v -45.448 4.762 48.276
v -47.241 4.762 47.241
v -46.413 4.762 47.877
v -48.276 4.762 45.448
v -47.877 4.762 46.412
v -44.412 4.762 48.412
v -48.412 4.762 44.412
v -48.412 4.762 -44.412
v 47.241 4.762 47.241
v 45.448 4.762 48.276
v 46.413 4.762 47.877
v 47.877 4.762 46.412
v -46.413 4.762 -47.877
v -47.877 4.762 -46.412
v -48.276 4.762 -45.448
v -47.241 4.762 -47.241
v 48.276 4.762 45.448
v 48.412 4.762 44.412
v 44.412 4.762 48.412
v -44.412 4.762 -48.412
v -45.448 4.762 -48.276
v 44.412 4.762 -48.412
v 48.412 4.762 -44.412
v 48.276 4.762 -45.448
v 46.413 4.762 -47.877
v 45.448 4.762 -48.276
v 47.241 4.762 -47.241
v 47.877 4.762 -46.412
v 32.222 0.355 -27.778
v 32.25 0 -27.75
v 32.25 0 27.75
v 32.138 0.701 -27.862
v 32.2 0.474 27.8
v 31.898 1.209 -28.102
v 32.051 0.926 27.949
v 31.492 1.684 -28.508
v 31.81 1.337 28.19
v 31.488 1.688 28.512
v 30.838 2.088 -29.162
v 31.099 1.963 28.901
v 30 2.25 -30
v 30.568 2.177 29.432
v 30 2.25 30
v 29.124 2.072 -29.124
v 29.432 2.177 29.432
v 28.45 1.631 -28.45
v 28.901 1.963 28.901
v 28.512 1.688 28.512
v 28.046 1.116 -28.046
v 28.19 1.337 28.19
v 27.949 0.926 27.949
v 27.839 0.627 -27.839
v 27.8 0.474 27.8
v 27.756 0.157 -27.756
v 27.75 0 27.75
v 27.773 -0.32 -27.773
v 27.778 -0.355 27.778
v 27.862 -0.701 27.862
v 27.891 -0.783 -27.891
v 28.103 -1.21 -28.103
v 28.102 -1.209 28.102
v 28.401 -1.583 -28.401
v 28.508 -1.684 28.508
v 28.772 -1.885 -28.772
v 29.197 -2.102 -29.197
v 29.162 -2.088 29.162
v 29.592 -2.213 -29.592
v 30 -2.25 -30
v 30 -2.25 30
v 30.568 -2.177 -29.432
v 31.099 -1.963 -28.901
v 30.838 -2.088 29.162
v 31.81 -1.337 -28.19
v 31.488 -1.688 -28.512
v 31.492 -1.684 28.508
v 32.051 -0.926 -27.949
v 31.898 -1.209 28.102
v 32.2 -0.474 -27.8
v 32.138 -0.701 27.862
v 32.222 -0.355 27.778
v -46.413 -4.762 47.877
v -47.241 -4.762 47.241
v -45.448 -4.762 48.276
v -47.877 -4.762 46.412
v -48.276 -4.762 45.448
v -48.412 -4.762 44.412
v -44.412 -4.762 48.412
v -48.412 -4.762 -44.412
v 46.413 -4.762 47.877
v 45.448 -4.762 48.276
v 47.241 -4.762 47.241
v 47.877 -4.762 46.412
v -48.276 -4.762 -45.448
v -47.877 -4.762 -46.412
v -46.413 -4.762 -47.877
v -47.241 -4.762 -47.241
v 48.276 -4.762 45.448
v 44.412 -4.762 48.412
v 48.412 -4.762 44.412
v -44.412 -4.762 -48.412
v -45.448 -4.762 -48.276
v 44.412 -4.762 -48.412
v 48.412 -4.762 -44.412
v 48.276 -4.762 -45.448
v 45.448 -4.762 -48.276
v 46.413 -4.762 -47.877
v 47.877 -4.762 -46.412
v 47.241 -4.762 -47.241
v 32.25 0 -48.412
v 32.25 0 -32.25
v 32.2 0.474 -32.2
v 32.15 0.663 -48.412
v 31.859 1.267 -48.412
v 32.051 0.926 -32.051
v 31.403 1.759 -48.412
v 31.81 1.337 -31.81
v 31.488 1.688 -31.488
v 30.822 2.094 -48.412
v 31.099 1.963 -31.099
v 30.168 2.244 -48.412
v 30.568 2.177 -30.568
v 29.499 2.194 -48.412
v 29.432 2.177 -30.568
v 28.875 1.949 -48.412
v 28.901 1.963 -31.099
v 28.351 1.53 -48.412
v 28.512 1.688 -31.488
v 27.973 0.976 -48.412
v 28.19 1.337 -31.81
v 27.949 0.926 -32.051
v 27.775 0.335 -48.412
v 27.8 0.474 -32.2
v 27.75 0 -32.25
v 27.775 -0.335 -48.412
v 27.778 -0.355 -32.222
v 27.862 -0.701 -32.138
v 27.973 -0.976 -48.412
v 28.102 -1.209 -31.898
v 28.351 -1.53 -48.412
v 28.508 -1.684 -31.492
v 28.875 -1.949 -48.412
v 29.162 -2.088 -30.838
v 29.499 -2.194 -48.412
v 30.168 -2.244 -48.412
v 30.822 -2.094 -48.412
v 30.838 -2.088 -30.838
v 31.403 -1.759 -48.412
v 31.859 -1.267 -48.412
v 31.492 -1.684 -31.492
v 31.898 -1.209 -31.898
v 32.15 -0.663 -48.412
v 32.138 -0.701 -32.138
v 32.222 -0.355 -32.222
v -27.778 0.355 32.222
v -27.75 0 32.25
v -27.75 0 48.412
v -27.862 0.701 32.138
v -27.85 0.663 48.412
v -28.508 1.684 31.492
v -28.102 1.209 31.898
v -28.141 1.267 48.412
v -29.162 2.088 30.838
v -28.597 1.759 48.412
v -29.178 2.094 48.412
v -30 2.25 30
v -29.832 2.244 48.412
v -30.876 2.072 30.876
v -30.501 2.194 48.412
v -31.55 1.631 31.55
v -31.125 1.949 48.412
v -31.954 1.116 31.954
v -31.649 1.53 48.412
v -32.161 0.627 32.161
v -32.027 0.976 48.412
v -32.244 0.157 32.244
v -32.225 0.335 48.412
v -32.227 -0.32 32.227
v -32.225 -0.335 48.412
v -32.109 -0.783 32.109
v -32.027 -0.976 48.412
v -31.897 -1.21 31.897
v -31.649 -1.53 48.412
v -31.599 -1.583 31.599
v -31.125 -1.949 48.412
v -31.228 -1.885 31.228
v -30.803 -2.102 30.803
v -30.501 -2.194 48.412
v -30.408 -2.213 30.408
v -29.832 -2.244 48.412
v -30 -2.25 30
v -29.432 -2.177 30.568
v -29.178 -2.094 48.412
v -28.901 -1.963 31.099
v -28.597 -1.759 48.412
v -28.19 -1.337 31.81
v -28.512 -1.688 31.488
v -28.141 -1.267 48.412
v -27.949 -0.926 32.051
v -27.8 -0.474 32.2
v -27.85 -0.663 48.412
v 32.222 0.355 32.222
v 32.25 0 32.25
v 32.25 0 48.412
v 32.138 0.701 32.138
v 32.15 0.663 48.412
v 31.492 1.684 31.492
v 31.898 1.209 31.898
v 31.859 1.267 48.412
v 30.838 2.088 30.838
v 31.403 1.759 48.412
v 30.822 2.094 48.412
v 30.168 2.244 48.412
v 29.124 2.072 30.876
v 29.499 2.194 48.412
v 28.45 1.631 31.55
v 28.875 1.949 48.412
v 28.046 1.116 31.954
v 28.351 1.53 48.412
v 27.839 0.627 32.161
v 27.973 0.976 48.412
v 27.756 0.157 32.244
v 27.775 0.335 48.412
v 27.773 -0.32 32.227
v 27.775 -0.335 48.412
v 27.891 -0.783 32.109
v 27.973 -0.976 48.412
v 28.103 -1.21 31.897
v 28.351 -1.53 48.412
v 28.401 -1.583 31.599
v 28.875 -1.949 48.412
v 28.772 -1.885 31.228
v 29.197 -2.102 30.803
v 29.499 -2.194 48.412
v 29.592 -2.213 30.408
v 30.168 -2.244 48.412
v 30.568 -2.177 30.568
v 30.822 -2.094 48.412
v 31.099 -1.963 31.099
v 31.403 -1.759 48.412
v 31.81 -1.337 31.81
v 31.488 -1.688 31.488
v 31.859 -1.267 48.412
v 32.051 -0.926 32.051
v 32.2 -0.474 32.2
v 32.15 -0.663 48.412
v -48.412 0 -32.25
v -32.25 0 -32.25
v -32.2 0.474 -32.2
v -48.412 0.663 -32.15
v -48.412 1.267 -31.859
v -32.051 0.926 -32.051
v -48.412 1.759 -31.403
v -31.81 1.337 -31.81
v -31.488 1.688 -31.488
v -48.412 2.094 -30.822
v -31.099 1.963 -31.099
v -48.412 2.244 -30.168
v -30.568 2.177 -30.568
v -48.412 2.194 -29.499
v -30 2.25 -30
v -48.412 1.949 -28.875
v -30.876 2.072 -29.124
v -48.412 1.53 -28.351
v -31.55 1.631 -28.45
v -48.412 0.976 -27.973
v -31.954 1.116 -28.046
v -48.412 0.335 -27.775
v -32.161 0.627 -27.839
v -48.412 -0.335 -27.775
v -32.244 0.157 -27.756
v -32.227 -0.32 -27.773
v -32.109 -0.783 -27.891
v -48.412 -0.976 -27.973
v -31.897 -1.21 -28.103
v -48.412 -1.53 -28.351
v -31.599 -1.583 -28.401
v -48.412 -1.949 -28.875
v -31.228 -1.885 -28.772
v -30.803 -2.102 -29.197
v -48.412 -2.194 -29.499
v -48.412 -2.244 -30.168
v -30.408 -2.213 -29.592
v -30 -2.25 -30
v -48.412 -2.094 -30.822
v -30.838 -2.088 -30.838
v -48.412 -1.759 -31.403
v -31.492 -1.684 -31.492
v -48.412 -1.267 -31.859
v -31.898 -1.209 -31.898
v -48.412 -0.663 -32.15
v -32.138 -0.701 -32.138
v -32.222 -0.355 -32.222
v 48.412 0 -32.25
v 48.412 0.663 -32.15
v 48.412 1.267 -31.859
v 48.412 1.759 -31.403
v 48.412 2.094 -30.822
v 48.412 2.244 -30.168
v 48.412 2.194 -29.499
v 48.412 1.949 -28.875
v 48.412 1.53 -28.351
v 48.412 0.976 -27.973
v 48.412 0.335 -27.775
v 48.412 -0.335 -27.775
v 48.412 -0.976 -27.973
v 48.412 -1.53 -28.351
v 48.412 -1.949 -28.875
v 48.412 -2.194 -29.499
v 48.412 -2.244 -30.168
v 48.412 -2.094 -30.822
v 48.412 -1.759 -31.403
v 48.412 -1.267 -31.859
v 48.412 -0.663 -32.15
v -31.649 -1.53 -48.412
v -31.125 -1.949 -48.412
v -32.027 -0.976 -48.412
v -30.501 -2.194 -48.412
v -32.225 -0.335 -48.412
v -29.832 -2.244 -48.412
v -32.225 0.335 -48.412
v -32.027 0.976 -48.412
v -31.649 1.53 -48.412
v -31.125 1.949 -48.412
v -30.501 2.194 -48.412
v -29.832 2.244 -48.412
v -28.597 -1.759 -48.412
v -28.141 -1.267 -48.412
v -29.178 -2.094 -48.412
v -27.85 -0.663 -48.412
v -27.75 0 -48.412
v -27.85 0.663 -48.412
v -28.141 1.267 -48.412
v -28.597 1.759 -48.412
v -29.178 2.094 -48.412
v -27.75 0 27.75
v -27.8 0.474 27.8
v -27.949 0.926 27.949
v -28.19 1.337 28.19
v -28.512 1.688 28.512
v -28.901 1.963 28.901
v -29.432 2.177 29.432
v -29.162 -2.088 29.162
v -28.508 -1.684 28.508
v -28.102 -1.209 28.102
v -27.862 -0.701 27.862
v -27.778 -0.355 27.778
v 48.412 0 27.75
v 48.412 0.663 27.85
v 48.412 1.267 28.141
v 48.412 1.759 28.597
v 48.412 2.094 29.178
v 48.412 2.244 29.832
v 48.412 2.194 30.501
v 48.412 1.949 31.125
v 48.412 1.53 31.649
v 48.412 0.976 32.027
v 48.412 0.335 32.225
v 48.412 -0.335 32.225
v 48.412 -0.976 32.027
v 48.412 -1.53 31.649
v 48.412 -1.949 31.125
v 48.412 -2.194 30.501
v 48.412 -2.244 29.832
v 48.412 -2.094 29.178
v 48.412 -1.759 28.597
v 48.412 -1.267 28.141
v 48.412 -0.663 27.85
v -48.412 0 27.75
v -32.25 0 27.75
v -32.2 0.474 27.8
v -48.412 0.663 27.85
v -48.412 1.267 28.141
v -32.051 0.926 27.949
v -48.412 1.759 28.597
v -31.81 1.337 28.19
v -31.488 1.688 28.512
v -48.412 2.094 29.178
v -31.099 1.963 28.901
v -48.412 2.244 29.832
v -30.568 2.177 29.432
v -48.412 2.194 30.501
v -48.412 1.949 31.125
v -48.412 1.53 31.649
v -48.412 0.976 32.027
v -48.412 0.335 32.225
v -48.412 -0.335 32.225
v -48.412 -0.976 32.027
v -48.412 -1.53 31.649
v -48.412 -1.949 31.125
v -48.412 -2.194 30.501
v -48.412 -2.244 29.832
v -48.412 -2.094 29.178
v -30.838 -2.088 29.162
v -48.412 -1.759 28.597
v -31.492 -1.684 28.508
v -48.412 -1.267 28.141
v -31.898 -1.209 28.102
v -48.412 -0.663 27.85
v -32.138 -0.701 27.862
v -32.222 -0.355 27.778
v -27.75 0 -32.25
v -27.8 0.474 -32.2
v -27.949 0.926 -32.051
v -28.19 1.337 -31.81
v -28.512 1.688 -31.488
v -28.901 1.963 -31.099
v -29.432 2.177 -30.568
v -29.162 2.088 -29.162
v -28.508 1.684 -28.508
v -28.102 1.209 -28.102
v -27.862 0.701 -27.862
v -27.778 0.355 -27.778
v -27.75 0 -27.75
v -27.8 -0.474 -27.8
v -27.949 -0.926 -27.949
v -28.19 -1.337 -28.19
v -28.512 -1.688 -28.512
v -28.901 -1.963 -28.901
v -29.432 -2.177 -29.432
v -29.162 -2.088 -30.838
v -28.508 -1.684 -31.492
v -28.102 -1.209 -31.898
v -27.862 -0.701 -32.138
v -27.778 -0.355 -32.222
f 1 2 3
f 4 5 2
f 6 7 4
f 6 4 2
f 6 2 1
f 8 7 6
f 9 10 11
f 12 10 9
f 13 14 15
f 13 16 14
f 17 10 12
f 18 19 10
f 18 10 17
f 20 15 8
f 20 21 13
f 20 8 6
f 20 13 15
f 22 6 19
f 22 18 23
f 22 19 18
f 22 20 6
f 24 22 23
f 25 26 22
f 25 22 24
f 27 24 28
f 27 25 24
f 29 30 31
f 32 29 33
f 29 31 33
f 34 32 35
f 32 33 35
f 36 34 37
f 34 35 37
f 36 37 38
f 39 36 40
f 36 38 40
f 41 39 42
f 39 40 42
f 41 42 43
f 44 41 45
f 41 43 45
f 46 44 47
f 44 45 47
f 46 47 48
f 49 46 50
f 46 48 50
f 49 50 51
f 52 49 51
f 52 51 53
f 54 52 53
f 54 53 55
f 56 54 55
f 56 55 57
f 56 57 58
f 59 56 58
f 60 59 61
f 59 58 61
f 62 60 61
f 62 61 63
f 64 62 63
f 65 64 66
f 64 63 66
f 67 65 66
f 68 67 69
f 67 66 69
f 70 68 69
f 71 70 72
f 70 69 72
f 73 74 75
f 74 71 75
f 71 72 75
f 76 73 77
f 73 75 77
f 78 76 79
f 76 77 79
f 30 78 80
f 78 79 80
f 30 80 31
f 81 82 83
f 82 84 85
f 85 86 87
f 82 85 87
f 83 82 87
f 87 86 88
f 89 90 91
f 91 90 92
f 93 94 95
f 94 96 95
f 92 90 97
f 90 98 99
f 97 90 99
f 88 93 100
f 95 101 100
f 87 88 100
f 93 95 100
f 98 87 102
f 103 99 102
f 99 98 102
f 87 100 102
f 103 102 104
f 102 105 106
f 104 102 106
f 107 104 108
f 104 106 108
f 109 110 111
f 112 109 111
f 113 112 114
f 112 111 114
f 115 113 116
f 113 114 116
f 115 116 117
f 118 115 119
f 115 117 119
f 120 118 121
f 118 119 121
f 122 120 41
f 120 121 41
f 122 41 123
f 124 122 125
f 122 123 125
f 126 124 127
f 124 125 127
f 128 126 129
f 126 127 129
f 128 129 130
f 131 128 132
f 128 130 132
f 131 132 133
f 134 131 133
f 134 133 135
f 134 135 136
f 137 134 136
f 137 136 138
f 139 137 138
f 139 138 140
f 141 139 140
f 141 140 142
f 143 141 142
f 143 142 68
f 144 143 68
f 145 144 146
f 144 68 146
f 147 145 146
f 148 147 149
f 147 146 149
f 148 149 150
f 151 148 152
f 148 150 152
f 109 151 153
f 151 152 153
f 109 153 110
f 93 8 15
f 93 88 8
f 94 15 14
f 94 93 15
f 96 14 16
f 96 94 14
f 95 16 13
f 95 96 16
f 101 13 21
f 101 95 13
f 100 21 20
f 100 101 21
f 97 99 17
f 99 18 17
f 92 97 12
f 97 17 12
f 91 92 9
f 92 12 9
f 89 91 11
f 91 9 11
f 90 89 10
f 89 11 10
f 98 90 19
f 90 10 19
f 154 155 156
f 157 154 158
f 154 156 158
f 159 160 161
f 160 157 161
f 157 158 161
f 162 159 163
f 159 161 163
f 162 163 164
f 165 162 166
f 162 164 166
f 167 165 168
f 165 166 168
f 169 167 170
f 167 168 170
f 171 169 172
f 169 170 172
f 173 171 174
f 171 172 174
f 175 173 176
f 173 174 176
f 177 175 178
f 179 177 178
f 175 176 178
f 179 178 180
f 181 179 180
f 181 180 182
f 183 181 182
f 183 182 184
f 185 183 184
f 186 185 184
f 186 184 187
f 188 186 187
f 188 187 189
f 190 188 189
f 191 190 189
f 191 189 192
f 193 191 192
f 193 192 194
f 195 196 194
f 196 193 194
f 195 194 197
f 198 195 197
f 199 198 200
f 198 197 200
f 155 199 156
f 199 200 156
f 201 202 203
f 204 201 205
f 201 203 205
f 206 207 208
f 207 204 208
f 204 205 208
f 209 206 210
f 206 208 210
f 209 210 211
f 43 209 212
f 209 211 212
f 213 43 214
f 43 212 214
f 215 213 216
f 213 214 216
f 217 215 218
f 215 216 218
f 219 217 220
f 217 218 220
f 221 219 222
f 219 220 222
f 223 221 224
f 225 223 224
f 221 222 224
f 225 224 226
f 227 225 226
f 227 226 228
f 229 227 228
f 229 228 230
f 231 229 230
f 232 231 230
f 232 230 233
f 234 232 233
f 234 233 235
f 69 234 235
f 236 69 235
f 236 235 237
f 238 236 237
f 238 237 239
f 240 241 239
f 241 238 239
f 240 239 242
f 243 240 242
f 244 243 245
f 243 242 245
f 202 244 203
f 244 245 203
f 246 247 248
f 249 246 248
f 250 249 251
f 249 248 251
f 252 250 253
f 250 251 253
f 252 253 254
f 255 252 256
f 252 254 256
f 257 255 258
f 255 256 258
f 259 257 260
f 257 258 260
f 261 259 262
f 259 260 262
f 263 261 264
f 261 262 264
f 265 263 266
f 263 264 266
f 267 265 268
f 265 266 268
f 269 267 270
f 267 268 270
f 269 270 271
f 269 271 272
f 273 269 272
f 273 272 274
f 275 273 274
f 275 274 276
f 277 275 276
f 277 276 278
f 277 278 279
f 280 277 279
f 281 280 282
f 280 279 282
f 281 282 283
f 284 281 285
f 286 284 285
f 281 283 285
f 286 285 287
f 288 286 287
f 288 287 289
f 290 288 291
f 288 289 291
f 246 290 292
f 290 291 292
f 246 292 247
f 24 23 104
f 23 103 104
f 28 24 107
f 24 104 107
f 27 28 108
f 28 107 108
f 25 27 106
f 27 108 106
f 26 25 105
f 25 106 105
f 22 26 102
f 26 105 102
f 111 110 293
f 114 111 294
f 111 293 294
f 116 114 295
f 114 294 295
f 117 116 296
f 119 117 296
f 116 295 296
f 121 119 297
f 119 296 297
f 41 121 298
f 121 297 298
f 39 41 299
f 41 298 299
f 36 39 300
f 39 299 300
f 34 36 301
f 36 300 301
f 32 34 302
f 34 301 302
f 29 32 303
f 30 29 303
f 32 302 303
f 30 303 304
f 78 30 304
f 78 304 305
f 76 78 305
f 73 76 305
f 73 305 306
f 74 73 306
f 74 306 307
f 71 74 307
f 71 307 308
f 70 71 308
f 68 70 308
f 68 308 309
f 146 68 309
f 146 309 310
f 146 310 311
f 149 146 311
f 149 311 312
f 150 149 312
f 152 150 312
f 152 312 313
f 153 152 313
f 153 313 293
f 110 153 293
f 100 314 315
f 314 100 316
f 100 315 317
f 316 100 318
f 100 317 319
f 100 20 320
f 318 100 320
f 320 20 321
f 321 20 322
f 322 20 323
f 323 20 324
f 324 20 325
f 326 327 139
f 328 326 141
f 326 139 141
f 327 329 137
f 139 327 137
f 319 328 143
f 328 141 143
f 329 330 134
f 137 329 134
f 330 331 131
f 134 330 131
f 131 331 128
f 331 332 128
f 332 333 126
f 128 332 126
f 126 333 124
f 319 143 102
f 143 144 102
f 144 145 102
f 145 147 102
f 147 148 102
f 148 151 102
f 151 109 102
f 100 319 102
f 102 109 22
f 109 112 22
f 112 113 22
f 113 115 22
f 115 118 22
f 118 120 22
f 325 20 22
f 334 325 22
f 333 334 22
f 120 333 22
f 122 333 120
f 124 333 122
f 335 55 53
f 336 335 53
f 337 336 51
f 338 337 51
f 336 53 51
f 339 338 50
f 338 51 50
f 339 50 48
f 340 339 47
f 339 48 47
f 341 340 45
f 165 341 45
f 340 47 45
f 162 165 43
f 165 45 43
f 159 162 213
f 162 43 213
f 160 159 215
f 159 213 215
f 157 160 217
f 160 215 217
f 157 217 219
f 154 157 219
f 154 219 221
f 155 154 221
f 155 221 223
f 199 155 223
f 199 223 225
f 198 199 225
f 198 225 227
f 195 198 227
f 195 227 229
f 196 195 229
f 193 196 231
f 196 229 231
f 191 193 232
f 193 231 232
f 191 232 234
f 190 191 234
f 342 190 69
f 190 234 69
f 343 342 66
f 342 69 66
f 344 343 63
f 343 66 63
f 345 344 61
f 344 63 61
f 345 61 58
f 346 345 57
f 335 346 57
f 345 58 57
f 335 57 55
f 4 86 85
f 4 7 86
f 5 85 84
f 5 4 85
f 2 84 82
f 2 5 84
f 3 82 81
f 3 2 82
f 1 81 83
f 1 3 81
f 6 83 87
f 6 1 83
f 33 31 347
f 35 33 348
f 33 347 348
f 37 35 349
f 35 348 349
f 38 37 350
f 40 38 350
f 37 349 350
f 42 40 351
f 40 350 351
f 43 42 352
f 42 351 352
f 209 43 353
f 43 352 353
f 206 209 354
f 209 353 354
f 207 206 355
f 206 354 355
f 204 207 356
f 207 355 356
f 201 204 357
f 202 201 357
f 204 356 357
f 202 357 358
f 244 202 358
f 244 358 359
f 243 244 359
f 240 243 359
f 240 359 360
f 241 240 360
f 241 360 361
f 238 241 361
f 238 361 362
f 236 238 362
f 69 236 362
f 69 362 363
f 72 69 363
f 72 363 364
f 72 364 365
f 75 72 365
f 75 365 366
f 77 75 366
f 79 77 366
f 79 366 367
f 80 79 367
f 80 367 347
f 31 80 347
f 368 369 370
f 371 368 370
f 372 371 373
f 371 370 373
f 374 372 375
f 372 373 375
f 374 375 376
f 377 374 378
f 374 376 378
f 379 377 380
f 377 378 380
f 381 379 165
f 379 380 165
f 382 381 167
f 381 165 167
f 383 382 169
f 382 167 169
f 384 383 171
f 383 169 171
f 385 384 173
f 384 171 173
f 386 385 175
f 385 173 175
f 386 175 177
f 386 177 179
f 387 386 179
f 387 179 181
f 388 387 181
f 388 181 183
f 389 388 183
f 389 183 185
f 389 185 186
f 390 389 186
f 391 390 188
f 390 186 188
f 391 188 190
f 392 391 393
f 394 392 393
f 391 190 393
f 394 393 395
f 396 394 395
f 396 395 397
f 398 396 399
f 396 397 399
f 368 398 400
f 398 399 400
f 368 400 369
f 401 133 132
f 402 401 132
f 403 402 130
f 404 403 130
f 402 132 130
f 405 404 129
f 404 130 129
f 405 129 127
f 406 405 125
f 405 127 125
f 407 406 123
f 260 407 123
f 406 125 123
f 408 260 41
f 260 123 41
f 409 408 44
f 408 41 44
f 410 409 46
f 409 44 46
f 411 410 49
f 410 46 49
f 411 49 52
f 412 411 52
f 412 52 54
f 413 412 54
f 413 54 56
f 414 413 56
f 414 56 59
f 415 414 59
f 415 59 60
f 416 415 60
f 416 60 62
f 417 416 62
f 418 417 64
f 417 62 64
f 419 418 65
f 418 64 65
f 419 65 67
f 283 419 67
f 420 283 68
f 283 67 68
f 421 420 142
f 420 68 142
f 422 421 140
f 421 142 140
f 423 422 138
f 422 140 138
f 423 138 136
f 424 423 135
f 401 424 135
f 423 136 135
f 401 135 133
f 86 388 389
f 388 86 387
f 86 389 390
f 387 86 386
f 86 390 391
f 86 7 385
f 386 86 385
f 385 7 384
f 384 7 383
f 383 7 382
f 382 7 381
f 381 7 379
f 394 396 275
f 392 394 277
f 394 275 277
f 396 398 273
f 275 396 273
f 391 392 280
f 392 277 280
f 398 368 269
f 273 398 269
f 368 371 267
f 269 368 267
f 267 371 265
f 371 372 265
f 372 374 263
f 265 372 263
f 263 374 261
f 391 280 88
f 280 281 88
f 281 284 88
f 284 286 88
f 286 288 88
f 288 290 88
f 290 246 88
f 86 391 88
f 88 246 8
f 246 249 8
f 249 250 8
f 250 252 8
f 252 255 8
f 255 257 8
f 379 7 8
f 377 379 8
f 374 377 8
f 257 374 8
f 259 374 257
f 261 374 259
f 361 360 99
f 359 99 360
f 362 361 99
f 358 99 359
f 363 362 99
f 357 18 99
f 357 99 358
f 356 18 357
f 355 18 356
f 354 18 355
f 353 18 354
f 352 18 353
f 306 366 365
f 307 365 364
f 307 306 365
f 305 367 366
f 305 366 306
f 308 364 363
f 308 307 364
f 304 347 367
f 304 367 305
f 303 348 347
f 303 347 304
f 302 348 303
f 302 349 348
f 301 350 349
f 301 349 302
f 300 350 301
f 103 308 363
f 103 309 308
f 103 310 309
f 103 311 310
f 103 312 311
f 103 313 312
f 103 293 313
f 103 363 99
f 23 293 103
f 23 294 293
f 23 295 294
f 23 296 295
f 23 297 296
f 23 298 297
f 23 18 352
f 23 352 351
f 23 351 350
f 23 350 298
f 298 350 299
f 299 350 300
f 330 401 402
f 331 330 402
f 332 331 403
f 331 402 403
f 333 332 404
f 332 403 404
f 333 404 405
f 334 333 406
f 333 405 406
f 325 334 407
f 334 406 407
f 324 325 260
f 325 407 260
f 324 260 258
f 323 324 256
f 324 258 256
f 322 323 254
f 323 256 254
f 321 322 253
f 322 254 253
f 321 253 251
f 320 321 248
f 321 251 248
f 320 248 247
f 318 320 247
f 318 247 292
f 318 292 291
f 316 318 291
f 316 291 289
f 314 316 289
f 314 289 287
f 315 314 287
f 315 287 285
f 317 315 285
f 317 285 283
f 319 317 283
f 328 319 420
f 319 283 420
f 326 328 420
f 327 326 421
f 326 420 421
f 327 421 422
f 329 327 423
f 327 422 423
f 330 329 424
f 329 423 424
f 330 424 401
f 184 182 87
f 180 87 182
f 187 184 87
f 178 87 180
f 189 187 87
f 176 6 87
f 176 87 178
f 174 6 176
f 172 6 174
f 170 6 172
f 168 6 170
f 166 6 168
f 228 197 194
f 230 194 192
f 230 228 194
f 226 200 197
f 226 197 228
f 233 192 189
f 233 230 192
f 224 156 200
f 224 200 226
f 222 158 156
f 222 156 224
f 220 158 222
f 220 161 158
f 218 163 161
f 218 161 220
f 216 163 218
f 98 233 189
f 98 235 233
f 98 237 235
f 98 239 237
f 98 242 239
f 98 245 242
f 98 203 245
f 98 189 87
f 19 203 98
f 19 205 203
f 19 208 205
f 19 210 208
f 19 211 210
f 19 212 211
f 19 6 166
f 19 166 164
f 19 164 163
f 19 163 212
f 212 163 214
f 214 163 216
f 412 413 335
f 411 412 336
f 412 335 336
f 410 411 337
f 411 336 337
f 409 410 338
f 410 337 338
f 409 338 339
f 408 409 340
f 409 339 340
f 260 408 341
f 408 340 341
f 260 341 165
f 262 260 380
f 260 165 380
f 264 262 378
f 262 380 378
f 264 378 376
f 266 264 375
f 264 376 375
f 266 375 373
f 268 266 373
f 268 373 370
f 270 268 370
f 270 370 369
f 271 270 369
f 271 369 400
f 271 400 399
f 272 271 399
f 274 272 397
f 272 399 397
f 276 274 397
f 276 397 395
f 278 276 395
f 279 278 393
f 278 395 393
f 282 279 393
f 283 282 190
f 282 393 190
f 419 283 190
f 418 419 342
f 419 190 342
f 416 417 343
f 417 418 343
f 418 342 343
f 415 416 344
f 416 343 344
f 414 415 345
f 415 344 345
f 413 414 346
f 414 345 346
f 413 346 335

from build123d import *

# Parameters (mm, degrees)
SKETCH1_W            = 96.825
SKETCH1_H            = 96.825
BOSS_EXTRUDE1_DEPTH  = 4.7625
FILLET1_R            = 4
M4_CLEARANCE_HOLE1_D = 4.5
M4_CLEARANCE_HOLE2_D = 4.5


with BuildPart() as part:
    # Sketch1 → Boss-Extrude1 (new body, symmetric)
    with BuildSketch(Plane(origin=(0, 0, 0), x_dir=(1, 0, 0), z_dir=(0, 1, 0))):
        Rectangle(SKETCH1_W, SKETCH1_H)
    extrude(amount=BOSS_EXTRUDE1_DEPTH, both=True)

    # Fillet1
    fillet1_edges = [part.edges().sort_by_distance(p)[0] for p in [
        (-48.4125, 0, -48.4125),
        (48.4125, 0, -48.4125),
        (48.4125, 0, 48.4125),
        (-48.4125, 0, 48.4125),
    ]]
    fillet(fillet1_edges, radius=FILLET1_R)

    # M4 Clearance Hole1 (through all)
    with Locations(Plane.ZY.offset(48.4125)):
        with Locations((-30, 0), (30, 0)):
            Hole(M4_CLEARANCE_HOLE1_D / 2)

    # M4 Clearance Hole2 (through all)
    with Locations(Plane(origin=(0, 0, -48.4125), x_dir=(-1, 0, 0), z_dir=(0, 0, -1))):
        with Locations((-30, 0), (30, 0)):
            Hole(M4_CLEARANCE_HOLE2_D / 2)


solid = part.part
